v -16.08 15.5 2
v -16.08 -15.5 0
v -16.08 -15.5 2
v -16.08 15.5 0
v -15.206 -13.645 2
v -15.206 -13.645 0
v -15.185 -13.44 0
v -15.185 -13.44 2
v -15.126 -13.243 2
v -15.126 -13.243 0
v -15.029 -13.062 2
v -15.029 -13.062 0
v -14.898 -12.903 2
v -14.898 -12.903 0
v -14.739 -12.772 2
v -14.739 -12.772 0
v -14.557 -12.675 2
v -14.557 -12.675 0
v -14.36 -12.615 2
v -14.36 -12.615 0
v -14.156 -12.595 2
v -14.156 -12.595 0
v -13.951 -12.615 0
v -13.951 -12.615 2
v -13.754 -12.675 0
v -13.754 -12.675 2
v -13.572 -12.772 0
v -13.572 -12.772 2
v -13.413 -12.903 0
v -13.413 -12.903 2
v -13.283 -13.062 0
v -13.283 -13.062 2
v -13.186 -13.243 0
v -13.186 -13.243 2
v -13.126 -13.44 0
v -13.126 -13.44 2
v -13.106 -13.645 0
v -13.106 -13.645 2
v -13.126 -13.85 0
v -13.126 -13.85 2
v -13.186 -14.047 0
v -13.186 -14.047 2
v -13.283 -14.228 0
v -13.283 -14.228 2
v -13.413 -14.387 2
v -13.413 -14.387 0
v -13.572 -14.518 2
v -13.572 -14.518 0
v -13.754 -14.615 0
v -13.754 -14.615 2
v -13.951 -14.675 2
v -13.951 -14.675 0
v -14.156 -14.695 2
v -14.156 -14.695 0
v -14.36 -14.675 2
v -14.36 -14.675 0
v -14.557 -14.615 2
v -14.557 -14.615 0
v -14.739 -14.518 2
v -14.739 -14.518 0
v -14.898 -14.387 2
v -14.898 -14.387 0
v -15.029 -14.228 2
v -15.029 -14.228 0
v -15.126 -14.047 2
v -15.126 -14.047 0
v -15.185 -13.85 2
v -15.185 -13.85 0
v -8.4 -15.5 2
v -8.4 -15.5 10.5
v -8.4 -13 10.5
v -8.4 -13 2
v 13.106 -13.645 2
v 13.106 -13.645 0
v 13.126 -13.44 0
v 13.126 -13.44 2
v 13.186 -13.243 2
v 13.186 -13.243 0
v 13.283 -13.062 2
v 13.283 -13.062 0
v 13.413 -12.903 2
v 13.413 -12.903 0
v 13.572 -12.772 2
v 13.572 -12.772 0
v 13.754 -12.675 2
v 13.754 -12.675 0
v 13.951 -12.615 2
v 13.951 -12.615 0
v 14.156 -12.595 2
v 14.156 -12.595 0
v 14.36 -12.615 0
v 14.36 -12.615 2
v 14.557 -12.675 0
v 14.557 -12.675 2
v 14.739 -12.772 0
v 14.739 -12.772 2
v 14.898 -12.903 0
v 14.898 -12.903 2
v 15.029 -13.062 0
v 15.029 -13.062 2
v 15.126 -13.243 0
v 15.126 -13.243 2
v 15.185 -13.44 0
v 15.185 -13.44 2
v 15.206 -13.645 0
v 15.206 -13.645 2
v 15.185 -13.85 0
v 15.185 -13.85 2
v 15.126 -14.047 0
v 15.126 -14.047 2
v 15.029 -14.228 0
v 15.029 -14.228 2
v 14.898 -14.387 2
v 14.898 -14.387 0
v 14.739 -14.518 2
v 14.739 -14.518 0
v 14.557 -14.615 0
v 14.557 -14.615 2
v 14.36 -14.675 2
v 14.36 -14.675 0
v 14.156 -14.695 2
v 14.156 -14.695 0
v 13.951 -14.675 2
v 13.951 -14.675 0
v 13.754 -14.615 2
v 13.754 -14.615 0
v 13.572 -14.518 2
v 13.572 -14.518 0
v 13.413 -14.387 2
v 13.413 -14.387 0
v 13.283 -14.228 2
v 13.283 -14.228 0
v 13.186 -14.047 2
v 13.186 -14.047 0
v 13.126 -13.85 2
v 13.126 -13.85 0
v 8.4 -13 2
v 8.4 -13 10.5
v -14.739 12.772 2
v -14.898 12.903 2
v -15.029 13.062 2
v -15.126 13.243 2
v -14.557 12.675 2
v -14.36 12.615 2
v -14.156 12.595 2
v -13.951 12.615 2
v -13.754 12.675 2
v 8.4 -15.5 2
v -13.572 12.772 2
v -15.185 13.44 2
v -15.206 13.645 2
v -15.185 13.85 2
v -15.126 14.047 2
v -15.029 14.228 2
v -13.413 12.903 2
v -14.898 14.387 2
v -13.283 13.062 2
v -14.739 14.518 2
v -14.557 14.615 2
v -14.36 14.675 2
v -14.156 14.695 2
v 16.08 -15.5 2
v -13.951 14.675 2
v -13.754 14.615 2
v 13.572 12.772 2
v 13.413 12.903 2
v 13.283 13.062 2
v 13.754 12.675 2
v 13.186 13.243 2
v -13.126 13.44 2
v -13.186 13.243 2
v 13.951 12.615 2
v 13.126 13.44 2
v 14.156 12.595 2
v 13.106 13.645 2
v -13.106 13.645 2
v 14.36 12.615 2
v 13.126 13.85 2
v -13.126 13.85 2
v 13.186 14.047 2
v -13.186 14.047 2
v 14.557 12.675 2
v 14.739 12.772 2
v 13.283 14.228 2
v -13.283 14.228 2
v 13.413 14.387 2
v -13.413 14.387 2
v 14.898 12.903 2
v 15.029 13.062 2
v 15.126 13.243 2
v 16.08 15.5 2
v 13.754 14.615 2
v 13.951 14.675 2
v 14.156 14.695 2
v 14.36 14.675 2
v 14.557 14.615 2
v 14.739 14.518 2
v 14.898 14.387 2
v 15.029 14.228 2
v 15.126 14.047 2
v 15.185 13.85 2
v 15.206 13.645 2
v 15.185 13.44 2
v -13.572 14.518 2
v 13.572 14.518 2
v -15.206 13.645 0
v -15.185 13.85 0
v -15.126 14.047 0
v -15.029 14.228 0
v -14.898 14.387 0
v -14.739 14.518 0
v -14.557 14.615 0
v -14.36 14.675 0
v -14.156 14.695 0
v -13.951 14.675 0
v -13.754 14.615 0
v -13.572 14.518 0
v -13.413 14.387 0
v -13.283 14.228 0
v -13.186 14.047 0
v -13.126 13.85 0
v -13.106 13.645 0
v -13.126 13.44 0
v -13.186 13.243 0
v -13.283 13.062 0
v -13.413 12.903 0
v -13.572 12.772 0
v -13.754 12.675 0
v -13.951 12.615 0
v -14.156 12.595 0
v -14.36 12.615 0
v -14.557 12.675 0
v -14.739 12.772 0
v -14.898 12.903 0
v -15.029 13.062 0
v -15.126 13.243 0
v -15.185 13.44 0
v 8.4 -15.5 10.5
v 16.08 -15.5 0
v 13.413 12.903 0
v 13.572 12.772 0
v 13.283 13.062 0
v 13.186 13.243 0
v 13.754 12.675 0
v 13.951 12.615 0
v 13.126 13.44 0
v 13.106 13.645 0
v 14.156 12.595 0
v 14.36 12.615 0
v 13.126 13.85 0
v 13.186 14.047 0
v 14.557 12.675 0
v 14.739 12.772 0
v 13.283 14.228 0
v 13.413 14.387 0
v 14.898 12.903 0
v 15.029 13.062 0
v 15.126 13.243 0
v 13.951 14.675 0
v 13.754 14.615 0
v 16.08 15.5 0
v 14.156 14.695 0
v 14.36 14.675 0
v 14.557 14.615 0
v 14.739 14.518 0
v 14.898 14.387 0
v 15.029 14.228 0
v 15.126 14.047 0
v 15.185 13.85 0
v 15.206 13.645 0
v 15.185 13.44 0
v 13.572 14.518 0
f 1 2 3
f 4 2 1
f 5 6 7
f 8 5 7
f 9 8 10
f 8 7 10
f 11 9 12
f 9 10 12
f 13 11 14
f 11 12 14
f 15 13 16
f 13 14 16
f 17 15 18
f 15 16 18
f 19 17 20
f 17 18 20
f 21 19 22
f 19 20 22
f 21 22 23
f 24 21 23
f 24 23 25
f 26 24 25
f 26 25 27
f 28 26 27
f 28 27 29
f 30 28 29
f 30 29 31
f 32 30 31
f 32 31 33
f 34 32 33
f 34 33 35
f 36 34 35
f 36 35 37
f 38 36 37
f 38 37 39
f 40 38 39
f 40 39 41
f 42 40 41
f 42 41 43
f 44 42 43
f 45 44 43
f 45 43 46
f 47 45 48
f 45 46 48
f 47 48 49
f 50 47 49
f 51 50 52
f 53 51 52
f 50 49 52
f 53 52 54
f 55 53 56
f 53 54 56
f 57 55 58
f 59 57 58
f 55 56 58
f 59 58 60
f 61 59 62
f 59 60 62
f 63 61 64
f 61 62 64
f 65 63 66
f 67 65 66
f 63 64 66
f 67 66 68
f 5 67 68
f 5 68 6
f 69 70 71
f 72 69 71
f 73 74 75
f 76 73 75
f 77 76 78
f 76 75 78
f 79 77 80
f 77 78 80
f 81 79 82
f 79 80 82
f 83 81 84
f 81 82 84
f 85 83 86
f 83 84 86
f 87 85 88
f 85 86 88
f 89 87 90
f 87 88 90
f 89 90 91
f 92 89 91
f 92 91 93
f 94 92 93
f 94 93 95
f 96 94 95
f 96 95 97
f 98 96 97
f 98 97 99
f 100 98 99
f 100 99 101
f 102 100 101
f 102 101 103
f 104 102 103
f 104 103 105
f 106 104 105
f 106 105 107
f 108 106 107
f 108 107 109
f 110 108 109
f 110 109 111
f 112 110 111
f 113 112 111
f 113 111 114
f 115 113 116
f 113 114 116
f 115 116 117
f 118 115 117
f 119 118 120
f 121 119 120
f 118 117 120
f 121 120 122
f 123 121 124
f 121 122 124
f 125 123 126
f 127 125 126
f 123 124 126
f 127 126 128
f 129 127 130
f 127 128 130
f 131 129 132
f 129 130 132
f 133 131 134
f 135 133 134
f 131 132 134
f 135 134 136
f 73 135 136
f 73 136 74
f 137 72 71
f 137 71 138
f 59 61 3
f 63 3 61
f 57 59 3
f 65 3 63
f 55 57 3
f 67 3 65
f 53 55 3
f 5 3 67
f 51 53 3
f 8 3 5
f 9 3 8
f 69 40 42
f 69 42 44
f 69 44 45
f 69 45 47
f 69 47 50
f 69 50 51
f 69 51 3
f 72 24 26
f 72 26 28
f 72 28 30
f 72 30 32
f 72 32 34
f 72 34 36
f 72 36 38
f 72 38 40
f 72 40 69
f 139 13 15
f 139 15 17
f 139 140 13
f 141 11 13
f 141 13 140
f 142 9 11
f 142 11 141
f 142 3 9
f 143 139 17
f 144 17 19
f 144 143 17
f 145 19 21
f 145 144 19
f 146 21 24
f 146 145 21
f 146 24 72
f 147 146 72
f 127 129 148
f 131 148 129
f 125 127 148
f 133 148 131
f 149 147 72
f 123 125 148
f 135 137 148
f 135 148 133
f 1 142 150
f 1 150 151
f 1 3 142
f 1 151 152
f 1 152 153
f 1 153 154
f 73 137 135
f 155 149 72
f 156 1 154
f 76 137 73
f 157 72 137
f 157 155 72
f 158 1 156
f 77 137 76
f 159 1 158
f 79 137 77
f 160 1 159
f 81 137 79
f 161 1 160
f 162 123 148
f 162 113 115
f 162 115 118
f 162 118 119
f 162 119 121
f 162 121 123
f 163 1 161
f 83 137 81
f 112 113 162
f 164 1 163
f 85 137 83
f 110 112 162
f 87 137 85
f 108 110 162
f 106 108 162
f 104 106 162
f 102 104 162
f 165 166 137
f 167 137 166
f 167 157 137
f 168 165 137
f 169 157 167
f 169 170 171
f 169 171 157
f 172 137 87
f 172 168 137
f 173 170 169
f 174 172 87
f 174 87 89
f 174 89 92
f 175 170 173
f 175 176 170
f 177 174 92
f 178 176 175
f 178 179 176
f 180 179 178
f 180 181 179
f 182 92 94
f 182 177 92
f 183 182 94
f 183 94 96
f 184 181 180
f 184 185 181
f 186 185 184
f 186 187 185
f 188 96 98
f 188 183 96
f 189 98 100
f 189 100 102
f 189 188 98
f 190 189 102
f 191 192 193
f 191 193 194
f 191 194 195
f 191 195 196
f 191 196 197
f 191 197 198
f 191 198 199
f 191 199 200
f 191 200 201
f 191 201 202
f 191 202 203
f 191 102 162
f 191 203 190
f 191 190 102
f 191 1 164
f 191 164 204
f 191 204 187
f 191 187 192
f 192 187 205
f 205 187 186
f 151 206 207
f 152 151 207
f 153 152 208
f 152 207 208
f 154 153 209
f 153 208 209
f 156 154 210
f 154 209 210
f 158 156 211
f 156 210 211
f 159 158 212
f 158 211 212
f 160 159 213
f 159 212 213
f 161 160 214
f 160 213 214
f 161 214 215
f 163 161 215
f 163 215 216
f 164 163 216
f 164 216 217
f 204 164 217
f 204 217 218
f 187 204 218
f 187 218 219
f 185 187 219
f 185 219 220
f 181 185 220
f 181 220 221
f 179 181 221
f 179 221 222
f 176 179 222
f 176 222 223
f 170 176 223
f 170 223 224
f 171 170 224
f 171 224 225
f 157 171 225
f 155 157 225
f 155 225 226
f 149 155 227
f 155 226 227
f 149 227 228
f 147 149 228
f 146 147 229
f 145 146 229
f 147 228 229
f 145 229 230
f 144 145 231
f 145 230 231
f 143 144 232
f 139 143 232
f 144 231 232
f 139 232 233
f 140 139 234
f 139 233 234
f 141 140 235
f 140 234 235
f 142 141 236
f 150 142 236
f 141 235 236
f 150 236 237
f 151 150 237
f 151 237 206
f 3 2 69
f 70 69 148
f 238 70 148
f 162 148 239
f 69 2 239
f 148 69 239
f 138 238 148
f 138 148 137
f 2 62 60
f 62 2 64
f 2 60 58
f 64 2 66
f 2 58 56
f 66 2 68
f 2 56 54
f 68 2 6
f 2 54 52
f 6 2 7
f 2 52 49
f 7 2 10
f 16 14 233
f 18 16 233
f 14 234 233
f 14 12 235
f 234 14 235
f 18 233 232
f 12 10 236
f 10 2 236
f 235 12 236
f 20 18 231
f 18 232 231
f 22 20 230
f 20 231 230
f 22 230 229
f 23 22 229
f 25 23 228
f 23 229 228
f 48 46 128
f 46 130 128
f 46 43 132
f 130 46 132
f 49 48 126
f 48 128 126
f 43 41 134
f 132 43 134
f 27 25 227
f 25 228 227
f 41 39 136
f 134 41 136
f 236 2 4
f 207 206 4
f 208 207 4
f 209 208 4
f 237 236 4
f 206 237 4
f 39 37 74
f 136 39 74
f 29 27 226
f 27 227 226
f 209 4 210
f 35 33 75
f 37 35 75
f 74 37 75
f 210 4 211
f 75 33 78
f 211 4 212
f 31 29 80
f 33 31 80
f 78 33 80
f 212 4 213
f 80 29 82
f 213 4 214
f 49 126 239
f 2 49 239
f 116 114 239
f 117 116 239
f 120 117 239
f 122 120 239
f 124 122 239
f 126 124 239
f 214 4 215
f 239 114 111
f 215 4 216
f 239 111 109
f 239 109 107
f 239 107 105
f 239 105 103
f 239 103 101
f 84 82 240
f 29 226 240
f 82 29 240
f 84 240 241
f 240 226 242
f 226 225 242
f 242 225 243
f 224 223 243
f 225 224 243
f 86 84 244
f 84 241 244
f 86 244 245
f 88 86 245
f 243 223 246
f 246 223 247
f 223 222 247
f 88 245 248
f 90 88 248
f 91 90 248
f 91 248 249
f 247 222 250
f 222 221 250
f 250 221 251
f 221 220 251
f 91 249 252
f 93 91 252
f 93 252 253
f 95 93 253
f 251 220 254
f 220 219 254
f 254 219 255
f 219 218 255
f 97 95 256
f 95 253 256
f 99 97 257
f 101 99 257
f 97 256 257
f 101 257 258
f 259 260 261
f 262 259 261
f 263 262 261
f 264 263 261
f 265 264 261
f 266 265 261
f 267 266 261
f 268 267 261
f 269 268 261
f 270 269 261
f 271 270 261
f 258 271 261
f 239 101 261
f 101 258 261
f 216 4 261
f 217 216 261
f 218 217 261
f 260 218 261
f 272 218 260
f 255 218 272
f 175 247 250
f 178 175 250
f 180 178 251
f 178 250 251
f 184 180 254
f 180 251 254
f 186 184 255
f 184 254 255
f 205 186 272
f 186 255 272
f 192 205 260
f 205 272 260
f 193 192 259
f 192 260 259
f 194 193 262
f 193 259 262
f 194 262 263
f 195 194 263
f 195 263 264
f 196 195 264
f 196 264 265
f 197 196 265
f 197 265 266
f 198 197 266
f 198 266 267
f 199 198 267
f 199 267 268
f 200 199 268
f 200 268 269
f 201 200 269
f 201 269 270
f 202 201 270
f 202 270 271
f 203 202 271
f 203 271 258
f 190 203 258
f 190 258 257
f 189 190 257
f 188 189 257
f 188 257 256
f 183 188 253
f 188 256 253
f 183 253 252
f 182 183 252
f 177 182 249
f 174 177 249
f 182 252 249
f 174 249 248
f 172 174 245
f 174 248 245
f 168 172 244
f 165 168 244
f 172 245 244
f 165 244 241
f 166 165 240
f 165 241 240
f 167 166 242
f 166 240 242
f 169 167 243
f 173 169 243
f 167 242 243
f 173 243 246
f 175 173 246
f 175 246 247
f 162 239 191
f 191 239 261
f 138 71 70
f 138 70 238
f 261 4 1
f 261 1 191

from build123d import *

# Parameters (mm, degrees)
F0_W     = 32.16
F0_H     = 31
F1_DEPTH = 2
F3_D     = 2.1
F3_DEPTH = 5
F4_W     = 16.8
F4_H     = 2.5
F5_DEPTH = 8.5


with BuildPart() as f1:
    # F0 (on Top) → F1 (new body)
    with BuildSketch(Plane.XY):
        Rectangle(F0_W, F0_H)
    extrude(amount=F1_DEPTH)

    # F3
    with Locations(Plane.XY.offset(2)):
        with Locations((-14.155587, 13.645), (14.155587, 13.645), (-14.155587, -13.645), (14.155587, -13.645)):
            Hole(F3_D / 2, depth=F3_DEPTH)

    # F4 (on face) → F5 (join)
    with BuildSketch(Plane.XY.offset(2)):
        with Locations((0, -14.25)):
            Rectangle(F4_W, F4_H)
    extrude(amount=F5_DEPTH)


solid = f1.part
